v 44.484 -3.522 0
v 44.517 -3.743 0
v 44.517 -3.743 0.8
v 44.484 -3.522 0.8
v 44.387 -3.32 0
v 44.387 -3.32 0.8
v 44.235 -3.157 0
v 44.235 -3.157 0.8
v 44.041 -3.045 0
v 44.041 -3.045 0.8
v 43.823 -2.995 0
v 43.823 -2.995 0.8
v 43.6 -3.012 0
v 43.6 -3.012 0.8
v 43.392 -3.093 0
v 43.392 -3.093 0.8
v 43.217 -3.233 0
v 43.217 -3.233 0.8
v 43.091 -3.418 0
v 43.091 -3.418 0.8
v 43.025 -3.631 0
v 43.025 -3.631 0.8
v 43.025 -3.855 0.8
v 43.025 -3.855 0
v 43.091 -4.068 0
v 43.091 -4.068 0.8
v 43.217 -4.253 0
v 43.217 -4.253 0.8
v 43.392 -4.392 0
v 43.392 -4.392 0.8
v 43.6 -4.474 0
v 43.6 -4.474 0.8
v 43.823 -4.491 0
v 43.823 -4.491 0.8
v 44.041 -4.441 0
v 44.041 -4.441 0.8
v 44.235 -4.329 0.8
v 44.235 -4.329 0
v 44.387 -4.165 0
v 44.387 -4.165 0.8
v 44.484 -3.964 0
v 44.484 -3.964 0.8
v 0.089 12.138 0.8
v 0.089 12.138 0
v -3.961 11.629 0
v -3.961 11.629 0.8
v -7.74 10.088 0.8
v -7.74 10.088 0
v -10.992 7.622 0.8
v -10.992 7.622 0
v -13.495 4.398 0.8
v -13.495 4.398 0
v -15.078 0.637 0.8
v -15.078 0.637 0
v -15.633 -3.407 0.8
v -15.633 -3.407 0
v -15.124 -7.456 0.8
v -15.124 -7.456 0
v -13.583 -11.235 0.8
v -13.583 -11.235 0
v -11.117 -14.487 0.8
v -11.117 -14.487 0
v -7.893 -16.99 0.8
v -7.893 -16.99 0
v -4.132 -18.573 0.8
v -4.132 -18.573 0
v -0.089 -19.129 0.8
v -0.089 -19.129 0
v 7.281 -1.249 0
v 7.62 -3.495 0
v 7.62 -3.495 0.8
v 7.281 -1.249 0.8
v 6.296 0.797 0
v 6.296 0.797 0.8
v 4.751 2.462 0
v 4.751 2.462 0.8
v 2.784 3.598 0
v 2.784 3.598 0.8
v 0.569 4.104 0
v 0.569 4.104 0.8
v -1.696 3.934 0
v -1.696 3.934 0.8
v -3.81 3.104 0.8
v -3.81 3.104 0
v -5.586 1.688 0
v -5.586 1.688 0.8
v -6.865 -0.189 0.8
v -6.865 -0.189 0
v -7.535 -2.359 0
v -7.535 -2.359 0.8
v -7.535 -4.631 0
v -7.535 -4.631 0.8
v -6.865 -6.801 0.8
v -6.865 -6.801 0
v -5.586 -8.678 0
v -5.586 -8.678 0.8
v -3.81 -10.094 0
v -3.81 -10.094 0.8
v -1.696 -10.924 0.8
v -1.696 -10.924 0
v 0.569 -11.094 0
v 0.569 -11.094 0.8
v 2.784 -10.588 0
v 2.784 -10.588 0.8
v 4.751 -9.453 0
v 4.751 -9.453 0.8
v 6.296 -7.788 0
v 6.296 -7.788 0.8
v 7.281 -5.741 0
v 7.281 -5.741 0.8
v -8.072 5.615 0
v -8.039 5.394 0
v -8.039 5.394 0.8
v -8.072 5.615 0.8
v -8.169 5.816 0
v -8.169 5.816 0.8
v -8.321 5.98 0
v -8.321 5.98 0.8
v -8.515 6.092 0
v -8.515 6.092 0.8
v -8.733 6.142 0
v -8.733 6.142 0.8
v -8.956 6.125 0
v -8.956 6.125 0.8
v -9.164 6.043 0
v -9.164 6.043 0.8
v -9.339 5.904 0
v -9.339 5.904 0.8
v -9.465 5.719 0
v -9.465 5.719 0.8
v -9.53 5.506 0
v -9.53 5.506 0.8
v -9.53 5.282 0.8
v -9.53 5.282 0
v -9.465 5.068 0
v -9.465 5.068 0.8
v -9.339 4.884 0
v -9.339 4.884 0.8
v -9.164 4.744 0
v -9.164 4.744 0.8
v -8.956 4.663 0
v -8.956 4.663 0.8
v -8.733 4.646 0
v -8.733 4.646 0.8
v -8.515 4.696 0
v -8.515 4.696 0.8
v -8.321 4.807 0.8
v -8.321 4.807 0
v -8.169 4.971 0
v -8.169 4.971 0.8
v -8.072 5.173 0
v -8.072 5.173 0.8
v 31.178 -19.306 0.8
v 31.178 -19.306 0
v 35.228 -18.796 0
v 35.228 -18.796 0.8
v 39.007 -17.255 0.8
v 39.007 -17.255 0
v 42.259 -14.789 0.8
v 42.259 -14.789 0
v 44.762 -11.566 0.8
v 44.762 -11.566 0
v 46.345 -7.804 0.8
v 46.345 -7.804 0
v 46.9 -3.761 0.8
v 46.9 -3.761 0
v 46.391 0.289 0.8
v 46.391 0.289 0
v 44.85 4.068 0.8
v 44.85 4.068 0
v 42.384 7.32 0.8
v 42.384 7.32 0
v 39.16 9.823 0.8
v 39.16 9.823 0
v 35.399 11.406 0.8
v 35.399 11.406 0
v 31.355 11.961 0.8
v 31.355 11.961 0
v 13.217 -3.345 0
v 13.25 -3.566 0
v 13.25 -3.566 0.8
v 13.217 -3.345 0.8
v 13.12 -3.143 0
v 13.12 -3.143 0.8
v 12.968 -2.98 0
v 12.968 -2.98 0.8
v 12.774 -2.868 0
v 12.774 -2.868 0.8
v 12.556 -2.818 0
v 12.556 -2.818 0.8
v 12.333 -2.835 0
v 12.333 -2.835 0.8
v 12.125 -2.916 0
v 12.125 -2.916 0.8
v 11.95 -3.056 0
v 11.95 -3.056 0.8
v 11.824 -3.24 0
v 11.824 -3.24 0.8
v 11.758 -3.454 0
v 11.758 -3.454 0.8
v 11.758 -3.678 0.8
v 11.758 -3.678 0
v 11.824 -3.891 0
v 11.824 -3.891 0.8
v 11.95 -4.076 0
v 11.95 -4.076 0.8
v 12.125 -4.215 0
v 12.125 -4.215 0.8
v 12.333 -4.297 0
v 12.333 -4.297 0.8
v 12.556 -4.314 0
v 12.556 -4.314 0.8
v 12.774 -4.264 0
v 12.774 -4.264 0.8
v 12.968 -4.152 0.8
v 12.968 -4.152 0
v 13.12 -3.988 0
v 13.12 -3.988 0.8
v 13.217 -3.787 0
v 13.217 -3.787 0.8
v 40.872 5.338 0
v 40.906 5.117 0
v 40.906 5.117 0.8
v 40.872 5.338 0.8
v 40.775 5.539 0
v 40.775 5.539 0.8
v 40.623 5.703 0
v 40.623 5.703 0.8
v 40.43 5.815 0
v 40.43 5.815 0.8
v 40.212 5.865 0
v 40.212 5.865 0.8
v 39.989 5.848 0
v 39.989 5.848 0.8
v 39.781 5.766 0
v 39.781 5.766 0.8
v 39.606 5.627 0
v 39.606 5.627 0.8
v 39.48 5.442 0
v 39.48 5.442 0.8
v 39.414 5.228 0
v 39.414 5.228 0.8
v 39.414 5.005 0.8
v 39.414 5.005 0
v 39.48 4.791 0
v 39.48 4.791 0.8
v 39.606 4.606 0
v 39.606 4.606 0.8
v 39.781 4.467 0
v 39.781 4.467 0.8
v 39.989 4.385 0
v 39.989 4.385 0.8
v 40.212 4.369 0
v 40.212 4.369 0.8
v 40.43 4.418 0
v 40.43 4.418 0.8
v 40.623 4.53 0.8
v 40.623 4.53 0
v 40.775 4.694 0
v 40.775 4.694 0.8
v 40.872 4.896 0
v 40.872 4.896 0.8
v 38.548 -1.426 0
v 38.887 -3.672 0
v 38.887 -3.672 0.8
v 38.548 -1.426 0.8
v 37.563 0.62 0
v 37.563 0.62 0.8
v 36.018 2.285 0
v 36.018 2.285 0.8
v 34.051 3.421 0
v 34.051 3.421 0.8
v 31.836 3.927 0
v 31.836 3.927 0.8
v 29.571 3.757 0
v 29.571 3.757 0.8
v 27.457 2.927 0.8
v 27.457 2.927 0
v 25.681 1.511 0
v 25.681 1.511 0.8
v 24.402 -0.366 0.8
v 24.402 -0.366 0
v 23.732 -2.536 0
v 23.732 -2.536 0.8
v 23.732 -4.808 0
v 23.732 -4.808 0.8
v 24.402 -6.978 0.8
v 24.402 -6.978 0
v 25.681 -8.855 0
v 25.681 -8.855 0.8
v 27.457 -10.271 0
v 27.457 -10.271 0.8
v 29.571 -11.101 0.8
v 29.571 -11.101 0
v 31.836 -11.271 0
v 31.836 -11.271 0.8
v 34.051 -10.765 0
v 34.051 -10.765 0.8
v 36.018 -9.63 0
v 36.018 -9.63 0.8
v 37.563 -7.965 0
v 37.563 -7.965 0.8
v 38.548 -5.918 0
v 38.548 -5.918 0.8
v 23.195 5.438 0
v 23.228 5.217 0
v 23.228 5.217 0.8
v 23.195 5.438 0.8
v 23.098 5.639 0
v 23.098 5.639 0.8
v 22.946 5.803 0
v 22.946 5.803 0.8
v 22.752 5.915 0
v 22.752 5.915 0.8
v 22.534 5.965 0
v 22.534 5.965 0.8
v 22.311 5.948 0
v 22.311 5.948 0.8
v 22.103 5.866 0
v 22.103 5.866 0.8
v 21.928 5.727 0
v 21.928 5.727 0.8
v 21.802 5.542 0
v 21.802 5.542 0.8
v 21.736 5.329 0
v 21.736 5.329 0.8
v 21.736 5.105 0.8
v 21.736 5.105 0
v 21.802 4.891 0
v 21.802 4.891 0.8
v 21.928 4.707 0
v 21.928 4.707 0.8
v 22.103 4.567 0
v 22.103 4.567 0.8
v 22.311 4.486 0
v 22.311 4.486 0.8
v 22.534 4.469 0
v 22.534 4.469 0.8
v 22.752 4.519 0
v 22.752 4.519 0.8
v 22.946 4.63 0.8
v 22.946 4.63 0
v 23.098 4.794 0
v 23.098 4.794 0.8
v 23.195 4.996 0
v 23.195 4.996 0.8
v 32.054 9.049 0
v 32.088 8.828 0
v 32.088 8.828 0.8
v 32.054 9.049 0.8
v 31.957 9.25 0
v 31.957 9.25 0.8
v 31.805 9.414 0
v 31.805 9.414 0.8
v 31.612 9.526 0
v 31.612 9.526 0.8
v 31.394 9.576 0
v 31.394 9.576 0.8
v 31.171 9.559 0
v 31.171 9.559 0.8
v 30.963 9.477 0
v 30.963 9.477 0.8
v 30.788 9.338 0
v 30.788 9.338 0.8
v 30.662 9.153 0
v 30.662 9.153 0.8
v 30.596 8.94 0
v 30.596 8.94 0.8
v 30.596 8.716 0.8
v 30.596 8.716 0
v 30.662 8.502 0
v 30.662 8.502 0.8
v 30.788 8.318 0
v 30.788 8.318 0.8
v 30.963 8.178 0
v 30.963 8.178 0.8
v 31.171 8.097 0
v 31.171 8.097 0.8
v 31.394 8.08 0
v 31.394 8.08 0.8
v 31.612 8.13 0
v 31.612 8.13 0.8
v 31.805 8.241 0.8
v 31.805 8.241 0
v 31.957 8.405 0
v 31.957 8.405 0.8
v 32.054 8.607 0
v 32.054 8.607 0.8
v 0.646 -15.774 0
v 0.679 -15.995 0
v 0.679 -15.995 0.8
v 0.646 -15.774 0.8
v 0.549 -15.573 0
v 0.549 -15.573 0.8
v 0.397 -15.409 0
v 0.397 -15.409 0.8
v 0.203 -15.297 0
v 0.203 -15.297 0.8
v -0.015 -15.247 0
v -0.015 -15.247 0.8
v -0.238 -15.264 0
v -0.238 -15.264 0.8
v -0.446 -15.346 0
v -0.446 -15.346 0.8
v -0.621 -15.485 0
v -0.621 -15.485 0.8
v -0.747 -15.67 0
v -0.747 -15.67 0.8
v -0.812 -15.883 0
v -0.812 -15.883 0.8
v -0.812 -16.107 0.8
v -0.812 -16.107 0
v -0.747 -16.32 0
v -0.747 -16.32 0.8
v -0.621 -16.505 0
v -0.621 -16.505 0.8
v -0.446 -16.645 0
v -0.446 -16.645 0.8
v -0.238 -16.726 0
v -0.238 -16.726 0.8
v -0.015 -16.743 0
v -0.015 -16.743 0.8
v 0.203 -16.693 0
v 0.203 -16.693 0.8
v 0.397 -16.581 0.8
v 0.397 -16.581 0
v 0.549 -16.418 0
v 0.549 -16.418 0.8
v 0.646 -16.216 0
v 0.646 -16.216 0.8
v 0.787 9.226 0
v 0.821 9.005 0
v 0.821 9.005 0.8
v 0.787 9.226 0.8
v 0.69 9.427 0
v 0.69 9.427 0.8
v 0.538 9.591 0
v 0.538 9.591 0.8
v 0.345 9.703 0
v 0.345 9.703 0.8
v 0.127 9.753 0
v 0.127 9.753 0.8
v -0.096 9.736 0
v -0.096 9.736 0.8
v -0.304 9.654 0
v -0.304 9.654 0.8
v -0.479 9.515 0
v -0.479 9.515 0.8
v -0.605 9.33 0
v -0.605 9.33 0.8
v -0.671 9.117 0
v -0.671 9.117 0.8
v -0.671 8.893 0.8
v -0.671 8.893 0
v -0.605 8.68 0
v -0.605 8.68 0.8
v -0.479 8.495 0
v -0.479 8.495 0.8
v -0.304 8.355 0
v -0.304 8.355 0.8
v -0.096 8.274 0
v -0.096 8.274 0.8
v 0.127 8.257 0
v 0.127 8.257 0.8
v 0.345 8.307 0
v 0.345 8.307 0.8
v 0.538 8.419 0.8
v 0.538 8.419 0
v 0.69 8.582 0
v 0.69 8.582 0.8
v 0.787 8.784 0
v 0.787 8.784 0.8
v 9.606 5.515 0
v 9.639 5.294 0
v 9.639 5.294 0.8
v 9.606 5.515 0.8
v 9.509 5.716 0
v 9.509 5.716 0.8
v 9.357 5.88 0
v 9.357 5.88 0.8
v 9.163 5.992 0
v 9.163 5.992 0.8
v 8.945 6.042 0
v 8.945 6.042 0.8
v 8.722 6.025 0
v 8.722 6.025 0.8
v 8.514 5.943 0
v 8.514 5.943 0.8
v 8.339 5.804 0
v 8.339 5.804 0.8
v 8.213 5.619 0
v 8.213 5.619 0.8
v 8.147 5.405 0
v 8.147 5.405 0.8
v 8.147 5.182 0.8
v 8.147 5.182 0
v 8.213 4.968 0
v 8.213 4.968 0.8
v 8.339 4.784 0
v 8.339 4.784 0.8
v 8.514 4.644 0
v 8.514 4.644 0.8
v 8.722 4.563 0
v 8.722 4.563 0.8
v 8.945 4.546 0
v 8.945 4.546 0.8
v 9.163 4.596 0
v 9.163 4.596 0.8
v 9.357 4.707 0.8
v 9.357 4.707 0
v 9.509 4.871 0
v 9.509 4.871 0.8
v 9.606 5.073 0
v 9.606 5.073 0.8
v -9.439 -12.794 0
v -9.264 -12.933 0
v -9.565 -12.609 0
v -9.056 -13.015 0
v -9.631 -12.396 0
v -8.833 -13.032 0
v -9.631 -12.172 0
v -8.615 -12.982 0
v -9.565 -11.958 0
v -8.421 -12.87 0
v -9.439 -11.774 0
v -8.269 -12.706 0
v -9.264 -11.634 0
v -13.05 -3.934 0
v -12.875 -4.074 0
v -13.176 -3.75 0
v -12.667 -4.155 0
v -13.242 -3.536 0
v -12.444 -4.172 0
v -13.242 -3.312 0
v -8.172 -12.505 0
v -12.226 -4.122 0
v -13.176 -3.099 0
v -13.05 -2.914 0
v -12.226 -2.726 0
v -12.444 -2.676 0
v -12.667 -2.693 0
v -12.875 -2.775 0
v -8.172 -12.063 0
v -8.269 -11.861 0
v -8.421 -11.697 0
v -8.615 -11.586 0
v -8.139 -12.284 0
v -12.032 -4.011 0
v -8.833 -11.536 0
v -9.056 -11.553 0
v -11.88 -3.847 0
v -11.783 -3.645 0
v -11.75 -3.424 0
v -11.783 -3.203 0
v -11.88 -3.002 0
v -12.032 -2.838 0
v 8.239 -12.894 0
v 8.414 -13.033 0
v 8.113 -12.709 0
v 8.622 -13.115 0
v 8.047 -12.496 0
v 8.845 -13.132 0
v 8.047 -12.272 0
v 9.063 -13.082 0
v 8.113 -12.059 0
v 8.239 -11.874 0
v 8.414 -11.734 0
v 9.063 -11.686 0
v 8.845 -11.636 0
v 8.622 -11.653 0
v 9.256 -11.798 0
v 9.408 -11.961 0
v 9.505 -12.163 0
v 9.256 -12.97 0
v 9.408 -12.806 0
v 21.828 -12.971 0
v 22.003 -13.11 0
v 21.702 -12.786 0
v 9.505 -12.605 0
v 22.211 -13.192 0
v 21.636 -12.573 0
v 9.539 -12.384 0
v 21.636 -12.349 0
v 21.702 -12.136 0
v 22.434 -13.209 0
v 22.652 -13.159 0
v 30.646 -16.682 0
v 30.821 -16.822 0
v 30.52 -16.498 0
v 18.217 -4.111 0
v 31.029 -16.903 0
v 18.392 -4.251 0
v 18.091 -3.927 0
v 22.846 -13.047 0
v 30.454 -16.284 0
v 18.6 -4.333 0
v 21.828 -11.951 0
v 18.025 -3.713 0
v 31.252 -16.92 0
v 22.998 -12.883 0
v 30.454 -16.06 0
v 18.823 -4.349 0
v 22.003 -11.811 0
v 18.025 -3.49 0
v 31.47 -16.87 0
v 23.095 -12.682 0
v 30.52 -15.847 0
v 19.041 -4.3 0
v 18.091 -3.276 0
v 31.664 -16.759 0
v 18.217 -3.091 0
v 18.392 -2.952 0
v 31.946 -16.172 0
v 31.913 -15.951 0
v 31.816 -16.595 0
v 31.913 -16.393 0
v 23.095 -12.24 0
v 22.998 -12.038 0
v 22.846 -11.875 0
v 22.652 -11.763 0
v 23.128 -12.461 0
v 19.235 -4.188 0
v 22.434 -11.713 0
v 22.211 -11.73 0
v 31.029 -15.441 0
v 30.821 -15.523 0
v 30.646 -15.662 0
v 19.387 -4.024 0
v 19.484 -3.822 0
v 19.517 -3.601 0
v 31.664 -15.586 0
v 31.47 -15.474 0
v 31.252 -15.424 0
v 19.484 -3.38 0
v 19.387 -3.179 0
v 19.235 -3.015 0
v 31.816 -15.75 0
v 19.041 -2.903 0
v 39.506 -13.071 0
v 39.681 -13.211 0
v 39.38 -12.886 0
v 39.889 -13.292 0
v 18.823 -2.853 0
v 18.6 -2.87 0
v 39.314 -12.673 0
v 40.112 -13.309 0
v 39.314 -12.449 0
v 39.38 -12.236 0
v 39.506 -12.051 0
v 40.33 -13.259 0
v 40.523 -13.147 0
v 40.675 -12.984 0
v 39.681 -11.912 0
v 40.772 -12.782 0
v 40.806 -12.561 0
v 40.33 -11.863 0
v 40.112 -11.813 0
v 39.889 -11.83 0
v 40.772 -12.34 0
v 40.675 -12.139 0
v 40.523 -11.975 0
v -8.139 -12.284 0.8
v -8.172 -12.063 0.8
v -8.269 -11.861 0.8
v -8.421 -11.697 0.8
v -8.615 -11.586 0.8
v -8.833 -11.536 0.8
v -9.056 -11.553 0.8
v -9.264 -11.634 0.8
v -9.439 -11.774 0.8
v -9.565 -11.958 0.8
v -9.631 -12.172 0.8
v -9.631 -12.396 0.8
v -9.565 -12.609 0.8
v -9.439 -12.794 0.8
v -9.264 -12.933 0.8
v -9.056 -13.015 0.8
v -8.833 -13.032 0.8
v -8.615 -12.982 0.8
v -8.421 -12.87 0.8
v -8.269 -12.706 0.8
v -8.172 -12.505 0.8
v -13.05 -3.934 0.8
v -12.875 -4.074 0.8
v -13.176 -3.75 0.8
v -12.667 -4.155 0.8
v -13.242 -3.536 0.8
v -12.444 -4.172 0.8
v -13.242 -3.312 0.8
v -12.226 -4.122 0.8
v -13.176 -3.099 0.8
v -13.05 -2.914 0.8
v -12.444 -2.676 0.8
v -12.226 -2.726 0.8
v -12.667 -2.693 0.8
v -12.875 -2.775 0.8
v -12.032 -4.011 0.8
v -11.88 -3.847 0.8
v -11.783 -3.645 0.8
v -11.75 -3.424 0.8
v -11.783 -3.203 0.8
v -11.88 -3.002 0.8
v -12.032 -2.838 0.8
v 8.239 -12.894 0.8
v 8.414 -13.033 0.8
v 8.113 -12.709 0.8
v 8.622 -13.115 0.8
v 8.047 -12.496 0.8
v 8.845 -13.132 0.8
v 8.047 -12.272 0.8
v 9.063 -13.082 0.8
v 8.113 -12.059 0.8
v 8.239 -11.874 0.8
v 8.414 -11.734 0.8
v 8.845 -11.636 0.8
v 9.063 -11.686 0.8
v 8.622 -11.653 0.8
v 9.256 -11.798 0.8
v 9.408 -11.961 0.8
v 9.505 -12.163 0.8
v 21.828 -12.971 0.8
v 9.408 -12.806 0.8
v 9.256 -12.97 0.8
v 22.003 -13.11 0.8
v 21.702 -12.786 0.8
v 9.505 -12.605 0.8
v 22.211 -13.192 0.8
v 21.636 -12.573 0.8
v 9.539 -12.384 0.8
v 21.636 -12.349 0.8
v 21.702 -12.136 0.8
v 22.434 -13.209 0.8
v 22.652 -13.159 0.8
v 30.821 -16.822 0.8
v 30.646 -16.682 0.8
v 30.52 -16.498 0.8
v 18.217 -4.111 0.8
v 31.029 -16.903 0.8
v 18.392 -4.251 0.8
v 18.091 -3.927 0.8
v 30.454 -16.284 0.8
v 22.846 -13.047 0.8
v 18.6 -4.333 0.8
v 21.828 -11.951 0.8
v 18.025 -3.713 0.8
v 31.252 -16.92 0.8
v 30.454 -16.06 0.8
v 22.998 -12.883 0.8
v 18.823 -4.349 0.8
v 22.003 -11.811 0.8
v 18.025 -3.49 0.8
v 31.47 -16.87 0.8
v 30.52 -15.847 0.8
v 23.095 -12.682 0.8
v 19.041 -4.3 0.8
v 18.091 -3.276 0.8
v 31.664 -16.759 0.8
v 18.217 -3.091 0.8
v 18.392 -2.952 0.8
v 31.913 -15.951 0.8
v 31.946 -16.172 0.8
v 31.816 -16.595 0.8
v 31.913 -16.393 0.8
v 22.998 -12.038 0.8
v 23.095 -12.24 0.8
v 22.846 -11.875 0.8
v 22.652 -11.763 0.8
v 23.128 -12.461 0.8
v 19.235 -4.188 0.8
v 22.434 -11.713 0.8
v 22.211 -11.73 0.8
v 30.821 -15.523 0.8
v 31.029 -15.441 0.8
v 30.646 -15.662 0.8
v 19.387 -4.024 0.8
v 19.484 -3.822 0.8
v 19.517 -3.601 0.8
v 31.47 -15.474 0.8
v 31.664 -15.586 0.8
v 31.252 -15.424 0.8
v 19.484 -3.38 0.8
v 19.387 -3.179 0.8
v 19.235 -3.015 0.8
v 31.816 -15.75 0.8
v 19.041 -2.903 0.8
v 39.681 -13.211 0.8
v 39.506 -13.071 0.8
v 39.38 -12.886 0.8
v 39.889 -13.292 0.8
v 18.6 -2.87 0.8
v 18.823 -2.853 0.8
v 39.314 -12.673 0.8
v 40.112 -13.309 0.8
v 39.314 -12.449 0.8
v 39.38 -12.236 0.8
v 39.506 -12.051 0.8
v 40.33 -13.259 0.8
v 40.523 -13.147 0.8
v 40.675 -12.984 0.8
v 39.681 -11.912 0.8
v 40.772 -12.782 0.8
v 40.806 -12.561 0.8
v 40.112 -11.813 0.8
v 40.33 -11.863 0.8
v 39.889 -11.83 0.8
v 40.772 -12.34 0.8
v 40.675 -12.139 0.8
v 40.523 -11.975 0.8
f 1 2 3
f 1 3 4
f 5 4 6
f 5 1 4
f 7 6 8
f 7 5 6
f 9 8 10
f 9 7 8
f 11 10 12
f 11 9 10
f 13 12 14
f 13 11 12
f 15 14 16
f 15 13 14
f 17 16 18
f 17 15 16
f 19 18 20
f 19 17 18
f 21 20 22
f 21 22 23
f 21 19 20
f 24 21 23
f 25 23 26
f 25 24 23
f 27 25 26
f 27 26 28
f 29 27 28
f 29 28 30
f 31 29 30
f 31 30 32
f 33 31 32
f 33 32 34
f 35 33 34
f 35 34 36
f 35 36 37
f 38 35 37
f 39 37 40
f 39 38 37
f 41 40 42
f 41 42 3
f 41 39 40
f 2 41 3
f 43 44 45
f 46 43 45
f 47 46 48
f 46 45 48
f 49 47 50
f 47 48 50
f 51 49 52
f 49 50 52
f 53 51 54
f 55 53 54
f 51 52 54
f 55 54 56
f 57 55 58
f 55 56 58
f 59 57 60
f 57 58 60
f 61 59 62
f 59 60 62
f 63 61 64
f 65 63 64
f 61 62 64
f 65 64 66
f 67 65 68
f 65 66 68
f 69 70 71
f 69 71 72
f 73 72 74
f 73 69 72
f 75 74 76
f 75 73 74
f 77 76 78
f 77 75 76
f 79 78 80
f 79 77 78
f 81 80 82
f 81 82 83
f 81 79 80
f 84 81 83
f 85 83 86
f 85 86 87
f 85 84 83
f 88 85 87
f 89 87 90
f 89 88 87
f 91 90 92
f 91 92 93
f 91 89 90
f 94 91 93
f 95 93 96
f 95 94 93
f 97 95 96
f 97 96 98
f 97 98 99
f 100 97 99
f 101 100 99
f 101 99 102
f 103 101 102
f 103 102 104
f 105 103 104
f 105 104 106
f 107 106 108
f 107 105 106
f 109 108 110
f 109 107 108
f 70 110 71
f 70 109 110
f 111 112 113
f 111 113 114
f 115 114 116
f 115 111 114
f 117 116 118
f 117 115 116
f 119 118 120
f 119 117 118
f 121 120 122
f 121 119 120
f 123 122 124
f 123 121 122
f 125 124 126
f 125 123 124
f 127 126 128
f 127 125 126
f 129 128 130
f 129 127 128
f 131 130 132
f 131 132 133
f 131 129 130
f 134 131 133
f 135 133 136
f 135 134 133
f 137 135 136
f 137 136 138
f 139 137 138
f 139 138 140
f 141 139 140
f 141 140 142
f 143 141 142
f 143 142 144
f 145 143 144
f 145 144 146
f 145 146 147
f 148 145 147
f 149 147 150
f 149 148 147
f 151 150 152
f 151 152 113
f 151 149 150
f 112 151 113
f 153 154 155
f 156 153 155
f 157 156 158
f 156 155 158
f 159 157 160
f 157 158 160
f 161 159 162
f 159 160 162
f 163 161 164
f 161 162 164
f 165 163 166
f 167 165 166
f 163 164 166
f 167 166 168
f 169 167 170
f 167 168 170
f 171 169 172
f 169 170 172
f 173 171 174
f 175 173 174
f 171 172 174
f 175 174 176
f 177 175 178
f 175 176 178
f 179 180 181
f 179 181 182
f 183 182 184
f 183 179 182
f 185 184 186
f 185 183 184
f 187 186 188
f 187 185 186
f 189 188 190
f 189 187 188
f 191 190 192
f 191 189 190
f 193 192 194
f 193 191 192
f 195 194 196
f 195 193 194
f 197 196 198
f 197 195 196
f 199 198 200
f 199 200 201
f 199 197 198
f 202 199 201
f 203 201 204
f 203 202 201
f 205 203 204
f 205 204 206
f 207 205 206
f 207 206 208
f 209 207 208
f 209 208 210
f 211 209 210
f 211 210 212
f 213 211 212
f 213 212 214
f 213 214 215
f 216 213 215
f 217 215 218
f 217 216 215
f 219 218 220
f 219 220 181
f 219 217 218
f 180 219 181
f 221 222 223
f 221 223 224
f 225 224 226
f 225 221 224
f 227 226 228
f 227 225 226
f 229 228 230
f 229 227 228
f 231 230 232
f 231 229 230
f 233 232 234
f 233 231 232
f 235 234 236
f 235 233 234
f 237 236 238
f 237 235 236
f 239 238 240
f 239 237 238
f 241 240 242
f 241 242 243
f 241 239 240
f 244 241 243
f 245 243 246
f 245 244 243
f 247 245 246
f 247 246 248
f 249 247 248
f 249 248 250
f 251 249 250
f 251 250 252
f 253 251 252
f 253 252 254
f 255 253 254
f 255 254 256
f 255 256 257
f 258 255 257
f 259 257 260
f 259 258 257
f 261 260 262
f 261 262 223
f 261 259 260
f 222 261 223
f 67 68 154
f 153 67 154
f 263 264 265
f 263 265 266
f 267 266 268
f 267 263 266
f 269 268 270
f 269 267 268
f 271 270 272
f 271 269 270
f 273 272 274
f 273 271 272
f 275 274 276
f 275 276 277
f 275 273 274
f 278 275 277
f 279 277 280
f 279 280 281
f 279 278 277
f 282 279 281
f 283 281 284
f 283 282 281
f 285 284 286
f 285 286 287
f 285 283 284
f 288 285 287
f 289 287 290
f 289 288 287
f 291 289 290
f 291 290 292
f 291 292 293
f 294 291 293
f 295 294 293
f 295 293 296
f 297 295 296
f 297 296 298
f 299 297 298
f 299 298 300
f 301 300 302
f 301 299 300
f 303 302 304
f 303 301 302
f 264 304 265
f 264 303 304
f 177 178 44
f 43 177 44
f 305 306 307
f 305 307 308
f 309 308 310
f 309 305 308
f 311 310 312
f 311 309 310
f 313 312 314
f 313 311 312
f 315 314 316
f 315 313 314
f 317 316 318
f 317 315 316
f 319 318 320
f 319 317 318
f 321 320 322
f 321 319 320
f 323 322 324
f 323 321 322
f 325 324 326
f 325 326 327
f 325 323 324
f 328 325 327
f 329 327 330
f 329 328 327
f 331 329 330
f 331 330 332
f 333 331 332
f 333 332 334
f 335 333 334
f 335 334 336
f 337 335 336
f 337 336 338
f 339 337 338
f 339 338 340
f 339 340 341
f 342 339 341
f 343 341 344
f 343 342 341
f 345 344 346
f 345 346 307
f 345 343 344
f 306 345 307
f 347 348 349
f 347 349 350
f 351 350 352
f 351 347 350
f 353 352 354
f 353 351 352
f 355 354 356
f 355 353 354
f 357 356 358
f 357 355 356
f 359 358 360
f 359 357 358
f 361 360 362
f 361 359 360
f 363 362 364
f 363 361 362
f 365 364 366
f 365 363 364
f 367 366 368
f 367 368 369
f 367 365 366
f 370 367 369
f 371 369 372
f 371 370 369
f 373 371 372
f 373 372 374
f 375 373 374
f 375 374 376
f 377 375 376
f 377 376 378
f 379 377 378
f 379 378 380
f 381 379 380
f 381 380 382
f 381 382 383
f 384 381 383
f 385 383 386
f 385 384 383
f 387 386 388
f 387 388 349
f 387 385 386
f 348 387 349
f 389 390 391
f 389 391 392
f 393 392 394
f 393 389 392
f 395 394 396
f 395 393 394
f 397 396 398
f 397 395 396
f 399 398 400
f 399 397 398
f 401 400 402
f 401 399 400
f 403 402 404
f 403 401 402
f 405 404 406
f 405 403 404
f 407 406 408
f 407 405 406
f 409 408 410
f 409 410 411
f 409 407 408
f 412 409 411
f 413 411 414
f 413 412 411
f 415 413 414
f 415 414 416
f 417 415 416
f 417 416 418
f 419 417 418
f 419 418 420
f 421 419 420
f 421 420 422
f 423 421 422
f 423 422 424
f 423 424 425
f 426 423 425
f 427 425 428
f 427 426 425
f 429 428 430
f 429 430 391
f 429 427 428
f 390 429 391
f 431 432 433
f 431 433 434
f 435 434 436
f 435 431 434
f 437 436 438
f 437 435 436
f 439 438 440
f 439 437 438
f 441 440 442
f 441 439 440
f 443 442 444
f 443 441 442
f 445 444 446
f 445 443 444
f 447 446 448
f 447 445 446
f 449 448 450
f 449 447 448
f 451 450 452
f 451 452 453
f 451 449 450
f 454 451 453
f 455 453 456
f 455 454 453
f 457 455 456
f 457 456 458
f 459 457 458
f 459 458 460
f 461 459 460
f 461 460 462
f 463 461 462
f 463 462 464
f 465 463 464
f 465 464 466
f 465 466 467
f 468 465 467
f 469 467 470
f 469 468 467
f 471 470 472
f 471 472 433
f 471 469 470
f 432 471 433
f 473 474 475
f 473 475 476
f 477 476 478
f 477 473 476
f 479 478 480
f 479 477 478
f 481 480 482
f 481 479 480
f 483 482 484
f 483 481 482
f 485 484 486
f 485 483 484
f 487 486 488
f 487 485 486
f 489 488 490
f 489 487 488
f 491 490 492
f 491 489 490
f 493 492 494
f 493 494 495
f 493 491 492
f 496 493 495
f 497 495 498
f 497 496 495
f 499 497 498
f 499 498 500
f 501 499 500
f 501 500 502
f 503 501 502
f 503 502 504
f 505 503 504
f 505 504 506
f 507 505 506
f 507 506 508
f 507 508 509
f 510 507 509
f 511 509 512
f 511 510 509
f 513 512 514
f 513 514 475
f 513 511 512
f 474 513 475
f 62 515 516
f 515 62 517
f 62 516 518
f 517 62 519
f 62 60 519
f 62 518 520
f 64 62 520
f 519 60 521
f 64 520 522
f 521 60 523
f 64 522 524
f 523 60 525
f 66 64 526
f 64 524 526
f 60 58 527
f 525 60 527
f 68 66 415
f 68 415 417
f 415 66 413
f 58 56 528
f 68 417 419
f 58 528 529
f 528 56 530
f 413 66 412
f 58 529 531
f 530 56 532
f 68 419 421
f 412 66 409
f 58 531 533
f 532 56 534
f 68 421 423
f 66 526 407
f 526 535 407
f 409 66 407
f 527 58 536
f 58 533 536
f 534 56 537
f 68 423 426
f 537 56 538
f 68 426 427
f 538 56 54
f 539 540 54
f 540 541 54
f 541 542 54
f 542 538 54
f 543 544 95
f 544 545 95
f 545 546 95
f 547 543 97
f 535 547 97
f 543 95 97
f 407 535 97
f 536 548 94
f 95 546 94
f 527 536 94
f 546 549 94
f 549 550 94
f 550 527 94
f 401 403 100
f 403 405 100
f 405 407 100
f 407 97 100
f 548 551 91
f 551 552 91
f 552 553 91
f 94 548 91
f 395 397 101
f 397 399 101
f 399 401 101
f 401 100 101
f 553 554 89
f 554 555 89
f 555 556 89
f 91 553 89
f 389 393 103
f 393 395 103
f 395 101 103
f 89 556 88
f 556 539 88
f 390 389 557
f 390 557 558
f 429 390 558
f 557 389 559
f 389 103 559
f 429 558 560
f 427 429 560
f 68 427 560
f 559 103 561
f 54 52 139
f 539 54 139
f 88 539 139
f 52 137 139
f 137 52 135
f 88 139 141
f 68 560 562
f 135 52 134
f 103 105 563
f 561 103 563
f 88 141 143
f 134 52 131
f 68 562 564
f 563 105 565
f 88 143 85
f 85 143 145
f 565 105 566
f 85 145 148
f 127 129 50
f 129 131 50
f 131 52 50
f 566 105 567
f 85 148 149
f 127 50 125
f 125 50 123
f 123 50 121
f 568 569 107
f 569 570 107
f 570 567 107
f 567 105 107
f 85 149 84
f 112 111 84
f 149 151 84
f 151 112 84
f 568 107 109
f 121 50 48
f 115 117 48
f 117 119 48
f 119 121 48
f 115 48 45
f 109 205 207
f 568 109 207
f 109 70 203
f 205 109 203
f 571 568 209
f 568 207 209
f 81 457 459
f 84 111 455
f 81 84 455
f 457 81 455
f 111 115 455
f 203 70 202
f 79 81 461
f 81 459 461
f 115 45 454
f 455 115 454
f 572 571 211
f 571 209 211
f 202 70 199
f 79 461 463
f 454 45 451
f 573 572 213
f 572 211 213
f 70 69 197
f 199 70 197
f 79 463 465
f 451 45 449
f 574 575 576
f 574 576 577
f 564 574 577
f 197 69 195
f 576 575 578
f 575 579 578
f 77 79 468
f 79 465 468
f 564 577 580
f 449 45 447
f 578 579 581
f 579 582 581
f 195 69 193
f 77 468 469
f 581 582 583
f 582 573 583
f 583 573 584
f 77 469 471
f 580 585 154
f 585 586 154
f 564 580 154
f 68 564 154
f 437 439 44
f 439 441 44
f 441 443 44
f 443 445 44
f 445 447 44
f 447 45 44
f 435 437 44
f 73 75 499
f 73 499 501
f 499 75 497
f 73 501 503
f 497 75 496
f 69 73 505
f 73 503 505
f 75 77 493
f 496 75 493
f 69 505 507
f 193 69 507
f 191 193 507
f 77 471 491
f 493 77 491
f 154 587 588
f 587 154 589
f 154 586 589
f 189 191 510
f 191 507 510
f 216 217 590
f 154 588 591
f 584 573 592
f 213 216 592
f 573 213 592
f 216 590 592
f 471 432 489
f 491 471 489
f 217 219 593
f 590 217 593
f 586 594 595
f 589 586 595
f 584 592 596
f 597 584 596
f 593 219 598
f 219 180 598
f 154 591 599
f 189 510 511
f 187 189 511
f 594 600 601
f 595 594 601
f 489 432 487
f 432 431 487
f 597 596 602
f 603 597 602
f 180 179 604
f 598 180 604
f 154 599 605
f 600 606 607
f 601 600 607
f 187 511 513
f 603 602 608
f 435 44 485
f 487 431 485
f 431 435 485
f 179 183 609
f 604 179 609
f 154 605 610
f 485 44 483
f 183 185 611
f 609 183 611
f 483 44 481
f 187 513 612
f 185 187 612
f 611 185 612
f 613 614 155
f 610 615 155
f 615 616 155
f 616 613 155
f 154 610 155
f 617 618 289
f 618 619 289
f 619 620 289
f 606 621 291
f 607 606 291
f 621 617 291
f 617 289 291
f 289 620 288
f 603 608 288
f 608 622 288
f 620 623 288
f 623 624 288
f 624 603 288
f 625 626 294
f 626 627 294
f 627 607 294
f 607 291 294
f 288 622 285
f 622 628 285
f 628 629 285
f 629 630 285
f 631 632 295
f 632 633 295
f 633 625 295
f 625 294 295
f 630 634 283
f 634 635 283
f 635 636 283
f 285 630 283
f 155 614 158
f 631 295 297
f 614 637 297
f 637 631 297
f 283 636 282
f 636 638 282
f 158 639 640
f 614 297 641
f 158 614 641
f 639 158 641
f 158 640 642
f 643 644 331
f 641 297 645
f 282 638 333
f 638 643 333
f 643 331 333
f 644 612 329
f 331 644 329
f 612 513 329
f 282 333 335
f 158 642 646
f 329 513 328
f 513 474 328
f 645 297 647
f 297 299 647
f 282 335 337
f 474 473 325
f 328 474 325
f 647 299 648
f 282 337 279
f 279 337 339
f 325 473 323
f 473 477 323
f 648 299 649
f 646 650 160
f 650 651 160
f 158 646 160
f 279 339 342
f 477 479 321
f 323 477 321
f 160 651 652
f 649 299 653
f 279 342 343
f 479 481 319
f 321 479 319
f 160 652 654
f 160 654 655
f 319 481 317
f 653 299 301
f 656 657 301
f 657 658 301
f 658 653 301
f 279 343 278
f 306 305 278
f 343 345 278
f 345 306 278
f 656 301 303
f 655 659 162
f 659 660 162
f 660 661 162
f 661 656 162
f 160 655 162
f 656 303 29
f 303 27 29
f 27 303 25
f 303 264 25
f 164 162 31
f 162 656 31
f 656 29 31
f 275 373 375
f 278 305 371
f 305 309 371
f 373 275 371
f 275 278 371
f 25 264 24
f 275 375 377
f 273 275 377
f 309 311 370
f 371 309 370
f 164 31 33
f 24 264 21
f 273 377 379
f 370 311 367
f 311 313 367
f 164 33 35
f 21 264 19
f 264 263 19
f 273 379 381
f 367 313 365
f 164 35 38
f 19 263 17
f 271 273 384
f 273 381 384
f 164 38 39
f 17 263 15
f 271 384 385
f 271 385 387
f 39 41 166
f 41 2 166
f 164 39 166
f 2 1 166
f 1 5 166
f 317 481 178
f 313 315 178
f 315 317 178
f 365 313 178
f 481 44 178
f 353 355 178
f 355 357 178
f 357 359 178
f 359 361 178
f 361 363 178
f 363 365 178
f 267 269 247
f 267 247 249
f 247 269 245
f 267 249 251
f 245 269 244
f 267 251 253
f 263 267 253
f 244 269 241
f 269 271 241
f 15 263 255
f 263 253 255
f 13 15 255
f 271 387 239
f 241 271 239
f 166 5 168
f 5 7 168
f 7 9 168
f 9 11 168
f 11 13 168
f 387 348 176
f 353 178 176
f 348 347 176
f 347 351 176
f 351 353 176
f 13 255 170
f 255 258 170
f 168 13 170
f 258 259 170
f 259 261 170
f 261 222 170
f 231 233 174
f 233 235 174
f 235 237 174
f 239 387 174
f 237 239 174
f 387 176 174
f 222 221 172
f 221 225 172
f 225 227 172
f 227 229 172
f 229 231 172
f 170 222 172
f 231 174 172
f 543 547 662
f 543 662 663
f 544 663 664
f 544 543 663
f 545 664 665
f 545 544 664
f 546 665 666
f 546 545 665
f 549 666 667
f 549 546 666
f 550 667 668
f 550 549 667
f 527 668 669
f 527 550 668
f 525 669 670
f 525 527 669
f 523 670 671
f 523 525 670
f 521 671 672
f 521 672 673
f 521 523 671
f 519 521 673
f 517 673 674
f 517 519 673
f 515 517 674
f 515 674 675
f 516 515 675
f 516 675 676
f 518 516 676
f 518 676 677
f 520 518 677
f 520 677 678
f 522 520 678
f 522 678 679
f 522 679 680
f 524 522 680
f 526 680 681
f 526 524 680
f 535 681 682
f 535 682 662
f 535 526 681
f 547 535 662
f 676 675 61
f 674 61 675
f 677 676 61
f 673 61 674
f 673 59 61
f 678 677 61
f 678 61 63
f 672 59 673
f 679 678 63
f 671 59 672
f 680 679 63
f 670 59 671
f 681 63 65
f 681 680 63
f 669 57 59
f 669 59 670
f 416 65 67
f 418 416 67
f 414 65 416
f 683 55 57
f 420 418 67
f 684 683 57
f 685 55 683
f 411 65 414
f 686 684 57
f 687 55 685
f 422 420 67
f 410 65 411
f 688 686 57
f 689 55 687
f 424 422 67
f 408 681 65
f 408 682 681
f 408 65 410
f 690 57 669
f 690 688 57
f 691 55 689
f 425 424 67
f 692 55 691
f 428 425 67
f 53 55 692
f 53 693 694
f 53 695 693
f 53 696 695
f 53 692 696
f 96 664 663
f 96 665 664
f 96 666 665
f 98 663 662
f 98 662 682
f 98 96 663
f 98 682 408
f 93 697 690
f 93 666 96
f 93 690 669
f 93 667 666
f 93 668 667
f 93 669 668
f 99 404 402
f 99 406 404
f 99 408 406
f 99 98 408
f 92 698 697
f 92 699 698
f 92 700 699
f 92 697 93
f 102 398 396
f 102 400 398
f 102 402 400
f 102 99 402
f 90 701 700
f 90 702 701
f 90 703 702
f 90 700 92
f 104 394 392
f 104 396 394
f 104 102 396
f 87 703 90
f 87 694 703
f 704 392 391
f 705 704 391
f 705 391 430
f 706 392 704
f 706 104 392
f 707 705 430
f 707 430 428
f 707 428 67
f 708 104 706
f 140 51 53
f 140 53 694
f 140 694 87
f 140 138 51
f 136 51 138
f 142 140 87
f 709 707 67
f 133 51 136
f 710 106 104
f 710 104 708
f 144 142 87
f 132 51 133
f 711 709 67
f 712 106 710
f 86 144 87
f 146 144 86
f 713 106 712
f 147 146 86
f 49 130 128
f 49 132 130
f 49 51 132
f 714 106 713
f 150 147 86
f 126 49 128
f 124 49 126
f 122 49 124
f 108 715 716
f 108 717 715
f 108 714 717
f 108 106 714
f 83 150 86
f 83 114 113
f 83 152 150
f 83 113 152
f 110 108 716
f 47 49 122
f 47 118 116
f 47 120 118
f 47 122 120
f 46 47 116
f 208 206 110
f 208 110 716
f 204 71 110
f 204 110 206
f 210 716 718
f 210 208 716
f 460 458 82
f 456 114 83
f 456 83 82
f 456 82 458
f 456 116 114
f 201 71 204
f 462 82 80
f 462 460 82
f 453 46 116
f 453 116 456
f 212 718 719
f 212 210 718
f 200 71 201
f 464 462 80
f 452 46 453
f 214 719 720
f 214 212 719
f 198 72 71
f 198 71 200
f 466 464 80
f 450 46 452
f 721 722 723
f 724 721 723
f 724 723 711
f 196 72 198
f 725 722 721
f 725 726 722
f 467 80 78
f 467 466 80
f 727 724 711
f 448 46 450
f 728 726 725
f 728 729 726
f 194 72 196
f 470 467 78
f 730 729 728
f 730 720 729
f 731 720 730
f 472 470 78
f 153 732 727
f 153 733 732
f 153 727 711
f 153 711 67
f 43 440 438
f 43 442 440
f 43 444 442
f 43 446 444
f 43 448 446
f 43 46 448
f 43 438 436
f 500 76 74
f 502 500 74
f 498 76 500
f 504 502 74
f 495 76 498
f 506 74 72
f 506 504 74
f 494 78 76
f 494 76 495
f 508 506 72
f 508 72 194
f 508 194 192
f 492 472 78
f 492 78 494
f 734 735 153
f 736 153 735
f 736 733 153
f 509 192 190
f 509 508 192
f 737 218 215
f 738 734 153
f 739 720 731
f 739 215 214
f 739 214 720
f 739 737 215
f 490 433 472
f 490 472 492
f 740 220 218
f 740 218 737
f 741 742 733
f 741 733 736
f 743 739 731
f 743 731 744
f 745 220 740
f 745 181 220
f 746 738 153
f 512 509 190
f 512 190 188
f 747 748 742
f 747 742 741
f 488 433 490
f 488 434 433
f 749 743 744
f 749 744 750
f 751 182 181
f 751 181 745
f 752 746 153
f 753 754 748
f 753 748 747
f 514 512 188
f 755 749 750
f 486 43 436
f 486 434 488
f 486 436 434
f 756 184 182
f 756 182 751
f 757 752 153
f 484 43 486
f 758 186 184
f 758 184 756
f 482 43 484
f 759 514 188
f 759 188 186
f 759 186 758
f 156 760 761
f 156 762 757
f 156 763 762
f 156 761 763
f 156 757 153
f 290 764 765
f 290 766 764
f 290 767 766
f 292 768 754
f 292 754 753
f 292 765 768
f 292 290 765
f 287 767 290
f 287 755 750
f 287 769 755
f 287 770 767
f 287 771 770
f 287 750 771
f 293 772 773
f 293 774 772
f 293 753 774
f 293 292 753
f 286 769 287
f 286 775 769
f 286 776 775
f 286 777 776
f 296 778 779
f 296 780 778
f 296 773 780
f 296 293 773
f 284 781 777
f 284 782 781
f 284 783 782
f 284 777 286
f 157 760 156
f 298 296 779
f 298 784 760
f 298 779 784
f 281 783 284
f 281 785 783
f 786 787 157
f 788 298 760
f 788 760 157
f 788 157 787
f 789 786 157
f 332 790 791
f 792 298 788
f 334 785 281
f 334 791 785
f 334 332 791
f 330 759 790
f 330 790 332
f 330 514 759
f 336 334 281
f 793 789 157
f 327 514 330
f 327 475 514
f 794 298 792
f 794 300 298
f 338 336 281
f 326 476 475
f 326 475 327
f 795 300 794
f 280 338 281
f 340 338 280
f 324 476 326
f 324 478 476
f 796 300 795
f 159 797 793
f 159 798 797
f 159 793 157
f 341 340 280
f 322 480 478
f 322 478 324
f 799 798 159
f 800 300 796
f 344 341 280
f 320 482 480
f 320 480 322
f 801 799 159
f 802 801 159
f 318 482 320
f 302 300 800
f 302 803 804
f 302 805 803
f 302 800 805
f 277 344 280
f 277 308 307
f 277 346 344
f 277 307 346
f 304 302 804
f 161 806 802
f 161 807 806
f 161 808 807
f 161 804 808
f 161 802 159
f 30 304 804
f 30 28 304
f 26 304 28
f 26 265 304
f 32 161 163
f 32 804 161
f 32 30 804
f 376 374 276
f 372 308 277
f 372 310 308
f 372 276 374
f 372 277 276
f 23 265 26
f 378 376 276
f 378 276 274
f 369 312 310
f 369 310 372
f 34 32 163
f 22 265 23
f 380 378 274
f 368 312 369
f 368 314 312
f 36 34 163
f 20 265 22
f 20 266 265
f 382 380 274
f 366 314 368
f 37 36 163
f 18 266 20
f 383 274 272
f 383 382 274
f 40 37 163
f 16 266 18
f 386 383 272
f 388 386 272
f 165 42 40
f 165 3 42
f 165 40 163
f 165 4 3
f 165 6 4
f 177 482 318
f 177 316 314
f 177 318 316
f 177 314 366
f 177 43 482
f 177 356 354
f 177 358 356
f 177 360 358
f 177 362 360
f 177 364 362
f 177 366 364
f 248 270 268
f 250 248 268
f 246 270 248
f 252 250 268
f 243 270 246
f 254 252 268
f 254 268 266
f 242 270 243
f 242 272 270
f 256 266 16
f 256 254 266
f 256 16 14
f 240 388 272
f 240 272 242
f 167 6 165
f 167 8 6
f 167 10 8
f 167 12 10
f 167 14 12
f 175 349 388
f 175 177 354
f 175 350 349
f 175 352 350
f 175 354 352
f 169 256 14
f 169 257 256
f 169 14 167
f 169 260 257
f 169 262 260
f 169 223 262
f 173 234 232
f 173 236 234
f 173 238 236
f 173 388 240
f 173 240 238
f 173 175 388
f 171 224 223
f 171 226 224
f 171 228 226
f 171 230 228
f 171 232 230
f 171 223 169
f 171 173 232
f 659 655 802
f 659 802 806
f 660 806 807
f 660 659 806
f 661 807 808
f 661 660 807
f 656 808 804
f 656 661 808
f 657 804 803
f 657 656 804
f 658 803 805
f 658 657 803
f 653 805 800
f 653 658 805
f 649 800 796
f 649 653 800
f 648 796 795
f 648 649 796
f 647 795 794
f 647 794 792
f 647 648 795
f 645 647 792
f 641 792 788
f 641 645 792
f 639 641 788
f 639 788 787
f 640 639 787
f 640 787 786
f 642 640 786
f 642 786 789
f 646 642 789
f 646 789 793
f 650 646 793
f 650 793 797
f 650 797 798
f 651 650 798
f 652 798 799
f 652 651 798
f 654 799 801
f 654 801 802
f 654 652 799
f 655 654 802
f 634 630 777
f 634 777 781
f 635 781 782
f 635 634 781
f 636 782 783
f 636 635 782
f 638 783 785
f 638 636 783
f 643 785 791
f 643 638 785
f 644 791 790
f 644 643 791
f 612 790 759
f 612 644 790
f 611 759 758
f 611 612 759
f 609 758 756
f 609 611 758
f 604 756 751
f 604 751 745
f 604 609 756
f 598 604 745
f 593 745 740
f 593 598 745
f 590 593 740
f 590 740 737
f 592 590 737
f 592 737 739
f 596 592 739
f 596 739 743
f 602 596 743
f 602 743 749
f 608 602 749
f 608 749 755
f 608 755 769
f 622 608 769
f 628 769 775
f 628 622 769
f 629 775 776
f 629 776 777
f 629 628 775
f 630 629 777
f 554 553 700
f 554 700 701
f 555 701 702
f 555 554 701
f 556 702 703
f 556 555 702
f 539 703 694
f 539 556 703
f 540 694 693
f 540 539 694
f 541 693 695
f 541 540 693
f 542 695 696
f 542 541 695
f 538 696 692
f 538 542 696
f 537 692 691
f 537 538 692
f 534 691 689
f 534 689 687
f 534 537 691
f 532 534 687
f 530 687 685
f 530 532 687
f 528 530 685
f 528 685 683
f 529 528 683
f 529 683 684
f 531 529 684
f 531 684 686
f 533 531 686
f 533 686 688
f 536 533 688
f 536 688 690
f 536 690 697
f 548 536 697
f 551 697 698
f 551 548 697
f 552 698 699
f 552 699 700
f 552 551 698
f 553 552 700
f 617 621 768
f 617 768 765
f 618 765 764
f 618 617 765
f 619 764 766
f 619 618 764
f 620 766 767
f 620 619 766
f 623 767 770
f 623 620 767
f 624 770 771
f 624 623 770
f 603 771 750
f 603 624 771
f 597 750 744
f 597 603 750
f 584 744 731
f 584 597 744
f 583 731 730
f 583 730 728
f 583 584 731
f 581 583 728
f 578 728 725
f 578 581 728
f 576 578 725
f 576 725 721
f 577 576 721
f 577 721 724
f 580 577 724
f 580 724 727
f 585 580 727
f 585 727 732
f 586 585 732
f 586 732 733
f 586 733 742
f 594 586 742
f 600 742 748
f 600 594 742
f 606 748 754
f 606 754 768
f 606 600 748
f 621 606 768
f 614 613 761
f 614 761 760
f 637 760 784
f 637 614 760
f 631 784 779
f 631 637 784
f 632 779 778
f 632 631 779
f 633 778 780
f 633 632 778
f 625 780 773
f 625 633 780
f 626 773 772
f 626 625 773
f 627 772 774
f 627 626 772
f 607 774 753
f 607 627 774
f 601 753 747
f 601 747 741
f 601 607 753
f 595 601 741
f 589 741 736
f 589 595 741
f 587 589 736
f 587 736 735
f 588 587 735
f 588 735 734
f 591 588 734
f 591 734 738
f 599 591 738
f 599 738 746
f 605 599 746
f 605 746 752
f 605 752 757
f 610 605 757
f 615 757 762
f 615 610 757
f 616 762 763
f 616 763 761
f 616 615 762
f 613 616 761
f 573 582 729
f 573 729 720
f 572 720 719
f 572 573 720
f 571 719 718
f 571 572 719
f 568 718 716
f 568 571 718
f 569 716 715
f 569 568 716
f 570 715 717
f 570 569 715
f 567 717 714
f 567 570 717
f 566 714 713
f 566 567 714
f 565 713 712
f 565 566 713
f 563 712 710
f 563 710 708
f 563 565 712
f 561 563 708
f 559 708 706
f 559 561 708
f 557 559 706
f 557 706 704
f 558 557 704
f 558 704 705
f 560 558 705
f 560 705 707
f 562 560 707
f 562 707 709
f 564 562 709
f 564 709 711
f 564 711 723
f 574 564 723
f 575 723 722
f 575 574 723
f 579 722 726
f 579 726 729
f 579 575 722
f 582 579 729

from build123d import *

# Parameters (mm, degrees)
SKETCH1_R           = 0.75
SKETCH1_R_2         = 7.62
BOSS_EXTRUDE1_DEPTH = 0.8


with BuildPart() as part:
    # Sketch1 → Boss-Extrude1 (new body)
    with BuildSketch(Plane.XY):
        with BuildLine():
            Line((-0.08854439, -19.128525646), (31.178350927, -19.305614409))
            ThreePointArc((31.178350927, -19.305614409), (46.900344572, -3.760709545), (31.355439708, 11.961284099))
            Line((31.355439708, 11.961284099), (0.08854439, 12.138372862))
            ThreePointArc((0.08854439, 12.138372862), (-15.633449254, -3.406532002), (-0.08854439, -19.128525646))
        make_face()
        with Locations((12.5, -3.565873621)):
            Circle(SKETCH1_R, mode=Mode.SUBTRACT)
        with Locations((0, -3.495076392)):
            Circle(SKETCH1_R_2, mode=Mode.SUBTRACT)
        with Locations((-12.5, -3.424279164)):
            Circle(SKETCH1_R, mode=Mode.SUBTRACT)
        with Locations((18.766895317, -3.601367926)):
            Circle(SKETCH1_R, mode=Mode.SUBTRACT)
        with Locations((31.266895317, -3.672165155)):
            Circle(SKETCH1_R_2, mode=Mode.SUBTRACT)
        with Locations((43.766895317, -3.742962383)):
            Circle(SKETCH1_R, mode=Mode.SUBTRACT)
        with Locations((31.196098089, -16.172165155)):
            Circle(SKETCH1_R, mode=Mode.SUBTRACT)
        with Locations((22.377999352, -12.460938719)):
            Circle(SKETCH1_R, mode=Mode.SUBTRACT)
        with Locations((40.055668882, -12.56106112)):
            Circle(SKETCH1_R, mode=Mode.SUBTRACT)
        with Locations((22.478121753, 5.21673081)):
            Circle(SKETCH1_R, mode=Mode.SUBTRACT)
        with Locations((40.155791283, 5.11660841)):
            Circle(SKETCH1_R, mode=Mode.SUBTRACT)
        with Locations((31.337692546, 8.827834845)):
            Circle(SKETCH1_R, mode=Mode.SUBTRACT)
        with Locations((8.788773564, -12.383972357)):
            Circle(SKETCH1_R, mode=Mode.SUBTRACT)
        with Locations((-0.070797229, -15.995076392)):
            Circle(SKETCH1_R, mode=Mode.SUBTRACT)
        with Locations((-8.888895965, -12.283849957)):
            Circle(SKETCH1_R, mode=Mode.SUBTRACT)
        with Locations((0.070797229, 9.004923608)):
            Circle(SKETCH1_R, mode=Mode.SUBTRACT)
        with Locations((8.888895965, 5.293697172)):
            Circle(SKETCH1_R, mode=Mode.SUBTRACT)
        with Locations((-8.788773564, 5.393819573)):
            Circle(SKETCH1_R, mode=Mode.SUBTRACT)
    extrude(amount=BOSS_EXTRUDE1_DEPTH)


solid = part.part
